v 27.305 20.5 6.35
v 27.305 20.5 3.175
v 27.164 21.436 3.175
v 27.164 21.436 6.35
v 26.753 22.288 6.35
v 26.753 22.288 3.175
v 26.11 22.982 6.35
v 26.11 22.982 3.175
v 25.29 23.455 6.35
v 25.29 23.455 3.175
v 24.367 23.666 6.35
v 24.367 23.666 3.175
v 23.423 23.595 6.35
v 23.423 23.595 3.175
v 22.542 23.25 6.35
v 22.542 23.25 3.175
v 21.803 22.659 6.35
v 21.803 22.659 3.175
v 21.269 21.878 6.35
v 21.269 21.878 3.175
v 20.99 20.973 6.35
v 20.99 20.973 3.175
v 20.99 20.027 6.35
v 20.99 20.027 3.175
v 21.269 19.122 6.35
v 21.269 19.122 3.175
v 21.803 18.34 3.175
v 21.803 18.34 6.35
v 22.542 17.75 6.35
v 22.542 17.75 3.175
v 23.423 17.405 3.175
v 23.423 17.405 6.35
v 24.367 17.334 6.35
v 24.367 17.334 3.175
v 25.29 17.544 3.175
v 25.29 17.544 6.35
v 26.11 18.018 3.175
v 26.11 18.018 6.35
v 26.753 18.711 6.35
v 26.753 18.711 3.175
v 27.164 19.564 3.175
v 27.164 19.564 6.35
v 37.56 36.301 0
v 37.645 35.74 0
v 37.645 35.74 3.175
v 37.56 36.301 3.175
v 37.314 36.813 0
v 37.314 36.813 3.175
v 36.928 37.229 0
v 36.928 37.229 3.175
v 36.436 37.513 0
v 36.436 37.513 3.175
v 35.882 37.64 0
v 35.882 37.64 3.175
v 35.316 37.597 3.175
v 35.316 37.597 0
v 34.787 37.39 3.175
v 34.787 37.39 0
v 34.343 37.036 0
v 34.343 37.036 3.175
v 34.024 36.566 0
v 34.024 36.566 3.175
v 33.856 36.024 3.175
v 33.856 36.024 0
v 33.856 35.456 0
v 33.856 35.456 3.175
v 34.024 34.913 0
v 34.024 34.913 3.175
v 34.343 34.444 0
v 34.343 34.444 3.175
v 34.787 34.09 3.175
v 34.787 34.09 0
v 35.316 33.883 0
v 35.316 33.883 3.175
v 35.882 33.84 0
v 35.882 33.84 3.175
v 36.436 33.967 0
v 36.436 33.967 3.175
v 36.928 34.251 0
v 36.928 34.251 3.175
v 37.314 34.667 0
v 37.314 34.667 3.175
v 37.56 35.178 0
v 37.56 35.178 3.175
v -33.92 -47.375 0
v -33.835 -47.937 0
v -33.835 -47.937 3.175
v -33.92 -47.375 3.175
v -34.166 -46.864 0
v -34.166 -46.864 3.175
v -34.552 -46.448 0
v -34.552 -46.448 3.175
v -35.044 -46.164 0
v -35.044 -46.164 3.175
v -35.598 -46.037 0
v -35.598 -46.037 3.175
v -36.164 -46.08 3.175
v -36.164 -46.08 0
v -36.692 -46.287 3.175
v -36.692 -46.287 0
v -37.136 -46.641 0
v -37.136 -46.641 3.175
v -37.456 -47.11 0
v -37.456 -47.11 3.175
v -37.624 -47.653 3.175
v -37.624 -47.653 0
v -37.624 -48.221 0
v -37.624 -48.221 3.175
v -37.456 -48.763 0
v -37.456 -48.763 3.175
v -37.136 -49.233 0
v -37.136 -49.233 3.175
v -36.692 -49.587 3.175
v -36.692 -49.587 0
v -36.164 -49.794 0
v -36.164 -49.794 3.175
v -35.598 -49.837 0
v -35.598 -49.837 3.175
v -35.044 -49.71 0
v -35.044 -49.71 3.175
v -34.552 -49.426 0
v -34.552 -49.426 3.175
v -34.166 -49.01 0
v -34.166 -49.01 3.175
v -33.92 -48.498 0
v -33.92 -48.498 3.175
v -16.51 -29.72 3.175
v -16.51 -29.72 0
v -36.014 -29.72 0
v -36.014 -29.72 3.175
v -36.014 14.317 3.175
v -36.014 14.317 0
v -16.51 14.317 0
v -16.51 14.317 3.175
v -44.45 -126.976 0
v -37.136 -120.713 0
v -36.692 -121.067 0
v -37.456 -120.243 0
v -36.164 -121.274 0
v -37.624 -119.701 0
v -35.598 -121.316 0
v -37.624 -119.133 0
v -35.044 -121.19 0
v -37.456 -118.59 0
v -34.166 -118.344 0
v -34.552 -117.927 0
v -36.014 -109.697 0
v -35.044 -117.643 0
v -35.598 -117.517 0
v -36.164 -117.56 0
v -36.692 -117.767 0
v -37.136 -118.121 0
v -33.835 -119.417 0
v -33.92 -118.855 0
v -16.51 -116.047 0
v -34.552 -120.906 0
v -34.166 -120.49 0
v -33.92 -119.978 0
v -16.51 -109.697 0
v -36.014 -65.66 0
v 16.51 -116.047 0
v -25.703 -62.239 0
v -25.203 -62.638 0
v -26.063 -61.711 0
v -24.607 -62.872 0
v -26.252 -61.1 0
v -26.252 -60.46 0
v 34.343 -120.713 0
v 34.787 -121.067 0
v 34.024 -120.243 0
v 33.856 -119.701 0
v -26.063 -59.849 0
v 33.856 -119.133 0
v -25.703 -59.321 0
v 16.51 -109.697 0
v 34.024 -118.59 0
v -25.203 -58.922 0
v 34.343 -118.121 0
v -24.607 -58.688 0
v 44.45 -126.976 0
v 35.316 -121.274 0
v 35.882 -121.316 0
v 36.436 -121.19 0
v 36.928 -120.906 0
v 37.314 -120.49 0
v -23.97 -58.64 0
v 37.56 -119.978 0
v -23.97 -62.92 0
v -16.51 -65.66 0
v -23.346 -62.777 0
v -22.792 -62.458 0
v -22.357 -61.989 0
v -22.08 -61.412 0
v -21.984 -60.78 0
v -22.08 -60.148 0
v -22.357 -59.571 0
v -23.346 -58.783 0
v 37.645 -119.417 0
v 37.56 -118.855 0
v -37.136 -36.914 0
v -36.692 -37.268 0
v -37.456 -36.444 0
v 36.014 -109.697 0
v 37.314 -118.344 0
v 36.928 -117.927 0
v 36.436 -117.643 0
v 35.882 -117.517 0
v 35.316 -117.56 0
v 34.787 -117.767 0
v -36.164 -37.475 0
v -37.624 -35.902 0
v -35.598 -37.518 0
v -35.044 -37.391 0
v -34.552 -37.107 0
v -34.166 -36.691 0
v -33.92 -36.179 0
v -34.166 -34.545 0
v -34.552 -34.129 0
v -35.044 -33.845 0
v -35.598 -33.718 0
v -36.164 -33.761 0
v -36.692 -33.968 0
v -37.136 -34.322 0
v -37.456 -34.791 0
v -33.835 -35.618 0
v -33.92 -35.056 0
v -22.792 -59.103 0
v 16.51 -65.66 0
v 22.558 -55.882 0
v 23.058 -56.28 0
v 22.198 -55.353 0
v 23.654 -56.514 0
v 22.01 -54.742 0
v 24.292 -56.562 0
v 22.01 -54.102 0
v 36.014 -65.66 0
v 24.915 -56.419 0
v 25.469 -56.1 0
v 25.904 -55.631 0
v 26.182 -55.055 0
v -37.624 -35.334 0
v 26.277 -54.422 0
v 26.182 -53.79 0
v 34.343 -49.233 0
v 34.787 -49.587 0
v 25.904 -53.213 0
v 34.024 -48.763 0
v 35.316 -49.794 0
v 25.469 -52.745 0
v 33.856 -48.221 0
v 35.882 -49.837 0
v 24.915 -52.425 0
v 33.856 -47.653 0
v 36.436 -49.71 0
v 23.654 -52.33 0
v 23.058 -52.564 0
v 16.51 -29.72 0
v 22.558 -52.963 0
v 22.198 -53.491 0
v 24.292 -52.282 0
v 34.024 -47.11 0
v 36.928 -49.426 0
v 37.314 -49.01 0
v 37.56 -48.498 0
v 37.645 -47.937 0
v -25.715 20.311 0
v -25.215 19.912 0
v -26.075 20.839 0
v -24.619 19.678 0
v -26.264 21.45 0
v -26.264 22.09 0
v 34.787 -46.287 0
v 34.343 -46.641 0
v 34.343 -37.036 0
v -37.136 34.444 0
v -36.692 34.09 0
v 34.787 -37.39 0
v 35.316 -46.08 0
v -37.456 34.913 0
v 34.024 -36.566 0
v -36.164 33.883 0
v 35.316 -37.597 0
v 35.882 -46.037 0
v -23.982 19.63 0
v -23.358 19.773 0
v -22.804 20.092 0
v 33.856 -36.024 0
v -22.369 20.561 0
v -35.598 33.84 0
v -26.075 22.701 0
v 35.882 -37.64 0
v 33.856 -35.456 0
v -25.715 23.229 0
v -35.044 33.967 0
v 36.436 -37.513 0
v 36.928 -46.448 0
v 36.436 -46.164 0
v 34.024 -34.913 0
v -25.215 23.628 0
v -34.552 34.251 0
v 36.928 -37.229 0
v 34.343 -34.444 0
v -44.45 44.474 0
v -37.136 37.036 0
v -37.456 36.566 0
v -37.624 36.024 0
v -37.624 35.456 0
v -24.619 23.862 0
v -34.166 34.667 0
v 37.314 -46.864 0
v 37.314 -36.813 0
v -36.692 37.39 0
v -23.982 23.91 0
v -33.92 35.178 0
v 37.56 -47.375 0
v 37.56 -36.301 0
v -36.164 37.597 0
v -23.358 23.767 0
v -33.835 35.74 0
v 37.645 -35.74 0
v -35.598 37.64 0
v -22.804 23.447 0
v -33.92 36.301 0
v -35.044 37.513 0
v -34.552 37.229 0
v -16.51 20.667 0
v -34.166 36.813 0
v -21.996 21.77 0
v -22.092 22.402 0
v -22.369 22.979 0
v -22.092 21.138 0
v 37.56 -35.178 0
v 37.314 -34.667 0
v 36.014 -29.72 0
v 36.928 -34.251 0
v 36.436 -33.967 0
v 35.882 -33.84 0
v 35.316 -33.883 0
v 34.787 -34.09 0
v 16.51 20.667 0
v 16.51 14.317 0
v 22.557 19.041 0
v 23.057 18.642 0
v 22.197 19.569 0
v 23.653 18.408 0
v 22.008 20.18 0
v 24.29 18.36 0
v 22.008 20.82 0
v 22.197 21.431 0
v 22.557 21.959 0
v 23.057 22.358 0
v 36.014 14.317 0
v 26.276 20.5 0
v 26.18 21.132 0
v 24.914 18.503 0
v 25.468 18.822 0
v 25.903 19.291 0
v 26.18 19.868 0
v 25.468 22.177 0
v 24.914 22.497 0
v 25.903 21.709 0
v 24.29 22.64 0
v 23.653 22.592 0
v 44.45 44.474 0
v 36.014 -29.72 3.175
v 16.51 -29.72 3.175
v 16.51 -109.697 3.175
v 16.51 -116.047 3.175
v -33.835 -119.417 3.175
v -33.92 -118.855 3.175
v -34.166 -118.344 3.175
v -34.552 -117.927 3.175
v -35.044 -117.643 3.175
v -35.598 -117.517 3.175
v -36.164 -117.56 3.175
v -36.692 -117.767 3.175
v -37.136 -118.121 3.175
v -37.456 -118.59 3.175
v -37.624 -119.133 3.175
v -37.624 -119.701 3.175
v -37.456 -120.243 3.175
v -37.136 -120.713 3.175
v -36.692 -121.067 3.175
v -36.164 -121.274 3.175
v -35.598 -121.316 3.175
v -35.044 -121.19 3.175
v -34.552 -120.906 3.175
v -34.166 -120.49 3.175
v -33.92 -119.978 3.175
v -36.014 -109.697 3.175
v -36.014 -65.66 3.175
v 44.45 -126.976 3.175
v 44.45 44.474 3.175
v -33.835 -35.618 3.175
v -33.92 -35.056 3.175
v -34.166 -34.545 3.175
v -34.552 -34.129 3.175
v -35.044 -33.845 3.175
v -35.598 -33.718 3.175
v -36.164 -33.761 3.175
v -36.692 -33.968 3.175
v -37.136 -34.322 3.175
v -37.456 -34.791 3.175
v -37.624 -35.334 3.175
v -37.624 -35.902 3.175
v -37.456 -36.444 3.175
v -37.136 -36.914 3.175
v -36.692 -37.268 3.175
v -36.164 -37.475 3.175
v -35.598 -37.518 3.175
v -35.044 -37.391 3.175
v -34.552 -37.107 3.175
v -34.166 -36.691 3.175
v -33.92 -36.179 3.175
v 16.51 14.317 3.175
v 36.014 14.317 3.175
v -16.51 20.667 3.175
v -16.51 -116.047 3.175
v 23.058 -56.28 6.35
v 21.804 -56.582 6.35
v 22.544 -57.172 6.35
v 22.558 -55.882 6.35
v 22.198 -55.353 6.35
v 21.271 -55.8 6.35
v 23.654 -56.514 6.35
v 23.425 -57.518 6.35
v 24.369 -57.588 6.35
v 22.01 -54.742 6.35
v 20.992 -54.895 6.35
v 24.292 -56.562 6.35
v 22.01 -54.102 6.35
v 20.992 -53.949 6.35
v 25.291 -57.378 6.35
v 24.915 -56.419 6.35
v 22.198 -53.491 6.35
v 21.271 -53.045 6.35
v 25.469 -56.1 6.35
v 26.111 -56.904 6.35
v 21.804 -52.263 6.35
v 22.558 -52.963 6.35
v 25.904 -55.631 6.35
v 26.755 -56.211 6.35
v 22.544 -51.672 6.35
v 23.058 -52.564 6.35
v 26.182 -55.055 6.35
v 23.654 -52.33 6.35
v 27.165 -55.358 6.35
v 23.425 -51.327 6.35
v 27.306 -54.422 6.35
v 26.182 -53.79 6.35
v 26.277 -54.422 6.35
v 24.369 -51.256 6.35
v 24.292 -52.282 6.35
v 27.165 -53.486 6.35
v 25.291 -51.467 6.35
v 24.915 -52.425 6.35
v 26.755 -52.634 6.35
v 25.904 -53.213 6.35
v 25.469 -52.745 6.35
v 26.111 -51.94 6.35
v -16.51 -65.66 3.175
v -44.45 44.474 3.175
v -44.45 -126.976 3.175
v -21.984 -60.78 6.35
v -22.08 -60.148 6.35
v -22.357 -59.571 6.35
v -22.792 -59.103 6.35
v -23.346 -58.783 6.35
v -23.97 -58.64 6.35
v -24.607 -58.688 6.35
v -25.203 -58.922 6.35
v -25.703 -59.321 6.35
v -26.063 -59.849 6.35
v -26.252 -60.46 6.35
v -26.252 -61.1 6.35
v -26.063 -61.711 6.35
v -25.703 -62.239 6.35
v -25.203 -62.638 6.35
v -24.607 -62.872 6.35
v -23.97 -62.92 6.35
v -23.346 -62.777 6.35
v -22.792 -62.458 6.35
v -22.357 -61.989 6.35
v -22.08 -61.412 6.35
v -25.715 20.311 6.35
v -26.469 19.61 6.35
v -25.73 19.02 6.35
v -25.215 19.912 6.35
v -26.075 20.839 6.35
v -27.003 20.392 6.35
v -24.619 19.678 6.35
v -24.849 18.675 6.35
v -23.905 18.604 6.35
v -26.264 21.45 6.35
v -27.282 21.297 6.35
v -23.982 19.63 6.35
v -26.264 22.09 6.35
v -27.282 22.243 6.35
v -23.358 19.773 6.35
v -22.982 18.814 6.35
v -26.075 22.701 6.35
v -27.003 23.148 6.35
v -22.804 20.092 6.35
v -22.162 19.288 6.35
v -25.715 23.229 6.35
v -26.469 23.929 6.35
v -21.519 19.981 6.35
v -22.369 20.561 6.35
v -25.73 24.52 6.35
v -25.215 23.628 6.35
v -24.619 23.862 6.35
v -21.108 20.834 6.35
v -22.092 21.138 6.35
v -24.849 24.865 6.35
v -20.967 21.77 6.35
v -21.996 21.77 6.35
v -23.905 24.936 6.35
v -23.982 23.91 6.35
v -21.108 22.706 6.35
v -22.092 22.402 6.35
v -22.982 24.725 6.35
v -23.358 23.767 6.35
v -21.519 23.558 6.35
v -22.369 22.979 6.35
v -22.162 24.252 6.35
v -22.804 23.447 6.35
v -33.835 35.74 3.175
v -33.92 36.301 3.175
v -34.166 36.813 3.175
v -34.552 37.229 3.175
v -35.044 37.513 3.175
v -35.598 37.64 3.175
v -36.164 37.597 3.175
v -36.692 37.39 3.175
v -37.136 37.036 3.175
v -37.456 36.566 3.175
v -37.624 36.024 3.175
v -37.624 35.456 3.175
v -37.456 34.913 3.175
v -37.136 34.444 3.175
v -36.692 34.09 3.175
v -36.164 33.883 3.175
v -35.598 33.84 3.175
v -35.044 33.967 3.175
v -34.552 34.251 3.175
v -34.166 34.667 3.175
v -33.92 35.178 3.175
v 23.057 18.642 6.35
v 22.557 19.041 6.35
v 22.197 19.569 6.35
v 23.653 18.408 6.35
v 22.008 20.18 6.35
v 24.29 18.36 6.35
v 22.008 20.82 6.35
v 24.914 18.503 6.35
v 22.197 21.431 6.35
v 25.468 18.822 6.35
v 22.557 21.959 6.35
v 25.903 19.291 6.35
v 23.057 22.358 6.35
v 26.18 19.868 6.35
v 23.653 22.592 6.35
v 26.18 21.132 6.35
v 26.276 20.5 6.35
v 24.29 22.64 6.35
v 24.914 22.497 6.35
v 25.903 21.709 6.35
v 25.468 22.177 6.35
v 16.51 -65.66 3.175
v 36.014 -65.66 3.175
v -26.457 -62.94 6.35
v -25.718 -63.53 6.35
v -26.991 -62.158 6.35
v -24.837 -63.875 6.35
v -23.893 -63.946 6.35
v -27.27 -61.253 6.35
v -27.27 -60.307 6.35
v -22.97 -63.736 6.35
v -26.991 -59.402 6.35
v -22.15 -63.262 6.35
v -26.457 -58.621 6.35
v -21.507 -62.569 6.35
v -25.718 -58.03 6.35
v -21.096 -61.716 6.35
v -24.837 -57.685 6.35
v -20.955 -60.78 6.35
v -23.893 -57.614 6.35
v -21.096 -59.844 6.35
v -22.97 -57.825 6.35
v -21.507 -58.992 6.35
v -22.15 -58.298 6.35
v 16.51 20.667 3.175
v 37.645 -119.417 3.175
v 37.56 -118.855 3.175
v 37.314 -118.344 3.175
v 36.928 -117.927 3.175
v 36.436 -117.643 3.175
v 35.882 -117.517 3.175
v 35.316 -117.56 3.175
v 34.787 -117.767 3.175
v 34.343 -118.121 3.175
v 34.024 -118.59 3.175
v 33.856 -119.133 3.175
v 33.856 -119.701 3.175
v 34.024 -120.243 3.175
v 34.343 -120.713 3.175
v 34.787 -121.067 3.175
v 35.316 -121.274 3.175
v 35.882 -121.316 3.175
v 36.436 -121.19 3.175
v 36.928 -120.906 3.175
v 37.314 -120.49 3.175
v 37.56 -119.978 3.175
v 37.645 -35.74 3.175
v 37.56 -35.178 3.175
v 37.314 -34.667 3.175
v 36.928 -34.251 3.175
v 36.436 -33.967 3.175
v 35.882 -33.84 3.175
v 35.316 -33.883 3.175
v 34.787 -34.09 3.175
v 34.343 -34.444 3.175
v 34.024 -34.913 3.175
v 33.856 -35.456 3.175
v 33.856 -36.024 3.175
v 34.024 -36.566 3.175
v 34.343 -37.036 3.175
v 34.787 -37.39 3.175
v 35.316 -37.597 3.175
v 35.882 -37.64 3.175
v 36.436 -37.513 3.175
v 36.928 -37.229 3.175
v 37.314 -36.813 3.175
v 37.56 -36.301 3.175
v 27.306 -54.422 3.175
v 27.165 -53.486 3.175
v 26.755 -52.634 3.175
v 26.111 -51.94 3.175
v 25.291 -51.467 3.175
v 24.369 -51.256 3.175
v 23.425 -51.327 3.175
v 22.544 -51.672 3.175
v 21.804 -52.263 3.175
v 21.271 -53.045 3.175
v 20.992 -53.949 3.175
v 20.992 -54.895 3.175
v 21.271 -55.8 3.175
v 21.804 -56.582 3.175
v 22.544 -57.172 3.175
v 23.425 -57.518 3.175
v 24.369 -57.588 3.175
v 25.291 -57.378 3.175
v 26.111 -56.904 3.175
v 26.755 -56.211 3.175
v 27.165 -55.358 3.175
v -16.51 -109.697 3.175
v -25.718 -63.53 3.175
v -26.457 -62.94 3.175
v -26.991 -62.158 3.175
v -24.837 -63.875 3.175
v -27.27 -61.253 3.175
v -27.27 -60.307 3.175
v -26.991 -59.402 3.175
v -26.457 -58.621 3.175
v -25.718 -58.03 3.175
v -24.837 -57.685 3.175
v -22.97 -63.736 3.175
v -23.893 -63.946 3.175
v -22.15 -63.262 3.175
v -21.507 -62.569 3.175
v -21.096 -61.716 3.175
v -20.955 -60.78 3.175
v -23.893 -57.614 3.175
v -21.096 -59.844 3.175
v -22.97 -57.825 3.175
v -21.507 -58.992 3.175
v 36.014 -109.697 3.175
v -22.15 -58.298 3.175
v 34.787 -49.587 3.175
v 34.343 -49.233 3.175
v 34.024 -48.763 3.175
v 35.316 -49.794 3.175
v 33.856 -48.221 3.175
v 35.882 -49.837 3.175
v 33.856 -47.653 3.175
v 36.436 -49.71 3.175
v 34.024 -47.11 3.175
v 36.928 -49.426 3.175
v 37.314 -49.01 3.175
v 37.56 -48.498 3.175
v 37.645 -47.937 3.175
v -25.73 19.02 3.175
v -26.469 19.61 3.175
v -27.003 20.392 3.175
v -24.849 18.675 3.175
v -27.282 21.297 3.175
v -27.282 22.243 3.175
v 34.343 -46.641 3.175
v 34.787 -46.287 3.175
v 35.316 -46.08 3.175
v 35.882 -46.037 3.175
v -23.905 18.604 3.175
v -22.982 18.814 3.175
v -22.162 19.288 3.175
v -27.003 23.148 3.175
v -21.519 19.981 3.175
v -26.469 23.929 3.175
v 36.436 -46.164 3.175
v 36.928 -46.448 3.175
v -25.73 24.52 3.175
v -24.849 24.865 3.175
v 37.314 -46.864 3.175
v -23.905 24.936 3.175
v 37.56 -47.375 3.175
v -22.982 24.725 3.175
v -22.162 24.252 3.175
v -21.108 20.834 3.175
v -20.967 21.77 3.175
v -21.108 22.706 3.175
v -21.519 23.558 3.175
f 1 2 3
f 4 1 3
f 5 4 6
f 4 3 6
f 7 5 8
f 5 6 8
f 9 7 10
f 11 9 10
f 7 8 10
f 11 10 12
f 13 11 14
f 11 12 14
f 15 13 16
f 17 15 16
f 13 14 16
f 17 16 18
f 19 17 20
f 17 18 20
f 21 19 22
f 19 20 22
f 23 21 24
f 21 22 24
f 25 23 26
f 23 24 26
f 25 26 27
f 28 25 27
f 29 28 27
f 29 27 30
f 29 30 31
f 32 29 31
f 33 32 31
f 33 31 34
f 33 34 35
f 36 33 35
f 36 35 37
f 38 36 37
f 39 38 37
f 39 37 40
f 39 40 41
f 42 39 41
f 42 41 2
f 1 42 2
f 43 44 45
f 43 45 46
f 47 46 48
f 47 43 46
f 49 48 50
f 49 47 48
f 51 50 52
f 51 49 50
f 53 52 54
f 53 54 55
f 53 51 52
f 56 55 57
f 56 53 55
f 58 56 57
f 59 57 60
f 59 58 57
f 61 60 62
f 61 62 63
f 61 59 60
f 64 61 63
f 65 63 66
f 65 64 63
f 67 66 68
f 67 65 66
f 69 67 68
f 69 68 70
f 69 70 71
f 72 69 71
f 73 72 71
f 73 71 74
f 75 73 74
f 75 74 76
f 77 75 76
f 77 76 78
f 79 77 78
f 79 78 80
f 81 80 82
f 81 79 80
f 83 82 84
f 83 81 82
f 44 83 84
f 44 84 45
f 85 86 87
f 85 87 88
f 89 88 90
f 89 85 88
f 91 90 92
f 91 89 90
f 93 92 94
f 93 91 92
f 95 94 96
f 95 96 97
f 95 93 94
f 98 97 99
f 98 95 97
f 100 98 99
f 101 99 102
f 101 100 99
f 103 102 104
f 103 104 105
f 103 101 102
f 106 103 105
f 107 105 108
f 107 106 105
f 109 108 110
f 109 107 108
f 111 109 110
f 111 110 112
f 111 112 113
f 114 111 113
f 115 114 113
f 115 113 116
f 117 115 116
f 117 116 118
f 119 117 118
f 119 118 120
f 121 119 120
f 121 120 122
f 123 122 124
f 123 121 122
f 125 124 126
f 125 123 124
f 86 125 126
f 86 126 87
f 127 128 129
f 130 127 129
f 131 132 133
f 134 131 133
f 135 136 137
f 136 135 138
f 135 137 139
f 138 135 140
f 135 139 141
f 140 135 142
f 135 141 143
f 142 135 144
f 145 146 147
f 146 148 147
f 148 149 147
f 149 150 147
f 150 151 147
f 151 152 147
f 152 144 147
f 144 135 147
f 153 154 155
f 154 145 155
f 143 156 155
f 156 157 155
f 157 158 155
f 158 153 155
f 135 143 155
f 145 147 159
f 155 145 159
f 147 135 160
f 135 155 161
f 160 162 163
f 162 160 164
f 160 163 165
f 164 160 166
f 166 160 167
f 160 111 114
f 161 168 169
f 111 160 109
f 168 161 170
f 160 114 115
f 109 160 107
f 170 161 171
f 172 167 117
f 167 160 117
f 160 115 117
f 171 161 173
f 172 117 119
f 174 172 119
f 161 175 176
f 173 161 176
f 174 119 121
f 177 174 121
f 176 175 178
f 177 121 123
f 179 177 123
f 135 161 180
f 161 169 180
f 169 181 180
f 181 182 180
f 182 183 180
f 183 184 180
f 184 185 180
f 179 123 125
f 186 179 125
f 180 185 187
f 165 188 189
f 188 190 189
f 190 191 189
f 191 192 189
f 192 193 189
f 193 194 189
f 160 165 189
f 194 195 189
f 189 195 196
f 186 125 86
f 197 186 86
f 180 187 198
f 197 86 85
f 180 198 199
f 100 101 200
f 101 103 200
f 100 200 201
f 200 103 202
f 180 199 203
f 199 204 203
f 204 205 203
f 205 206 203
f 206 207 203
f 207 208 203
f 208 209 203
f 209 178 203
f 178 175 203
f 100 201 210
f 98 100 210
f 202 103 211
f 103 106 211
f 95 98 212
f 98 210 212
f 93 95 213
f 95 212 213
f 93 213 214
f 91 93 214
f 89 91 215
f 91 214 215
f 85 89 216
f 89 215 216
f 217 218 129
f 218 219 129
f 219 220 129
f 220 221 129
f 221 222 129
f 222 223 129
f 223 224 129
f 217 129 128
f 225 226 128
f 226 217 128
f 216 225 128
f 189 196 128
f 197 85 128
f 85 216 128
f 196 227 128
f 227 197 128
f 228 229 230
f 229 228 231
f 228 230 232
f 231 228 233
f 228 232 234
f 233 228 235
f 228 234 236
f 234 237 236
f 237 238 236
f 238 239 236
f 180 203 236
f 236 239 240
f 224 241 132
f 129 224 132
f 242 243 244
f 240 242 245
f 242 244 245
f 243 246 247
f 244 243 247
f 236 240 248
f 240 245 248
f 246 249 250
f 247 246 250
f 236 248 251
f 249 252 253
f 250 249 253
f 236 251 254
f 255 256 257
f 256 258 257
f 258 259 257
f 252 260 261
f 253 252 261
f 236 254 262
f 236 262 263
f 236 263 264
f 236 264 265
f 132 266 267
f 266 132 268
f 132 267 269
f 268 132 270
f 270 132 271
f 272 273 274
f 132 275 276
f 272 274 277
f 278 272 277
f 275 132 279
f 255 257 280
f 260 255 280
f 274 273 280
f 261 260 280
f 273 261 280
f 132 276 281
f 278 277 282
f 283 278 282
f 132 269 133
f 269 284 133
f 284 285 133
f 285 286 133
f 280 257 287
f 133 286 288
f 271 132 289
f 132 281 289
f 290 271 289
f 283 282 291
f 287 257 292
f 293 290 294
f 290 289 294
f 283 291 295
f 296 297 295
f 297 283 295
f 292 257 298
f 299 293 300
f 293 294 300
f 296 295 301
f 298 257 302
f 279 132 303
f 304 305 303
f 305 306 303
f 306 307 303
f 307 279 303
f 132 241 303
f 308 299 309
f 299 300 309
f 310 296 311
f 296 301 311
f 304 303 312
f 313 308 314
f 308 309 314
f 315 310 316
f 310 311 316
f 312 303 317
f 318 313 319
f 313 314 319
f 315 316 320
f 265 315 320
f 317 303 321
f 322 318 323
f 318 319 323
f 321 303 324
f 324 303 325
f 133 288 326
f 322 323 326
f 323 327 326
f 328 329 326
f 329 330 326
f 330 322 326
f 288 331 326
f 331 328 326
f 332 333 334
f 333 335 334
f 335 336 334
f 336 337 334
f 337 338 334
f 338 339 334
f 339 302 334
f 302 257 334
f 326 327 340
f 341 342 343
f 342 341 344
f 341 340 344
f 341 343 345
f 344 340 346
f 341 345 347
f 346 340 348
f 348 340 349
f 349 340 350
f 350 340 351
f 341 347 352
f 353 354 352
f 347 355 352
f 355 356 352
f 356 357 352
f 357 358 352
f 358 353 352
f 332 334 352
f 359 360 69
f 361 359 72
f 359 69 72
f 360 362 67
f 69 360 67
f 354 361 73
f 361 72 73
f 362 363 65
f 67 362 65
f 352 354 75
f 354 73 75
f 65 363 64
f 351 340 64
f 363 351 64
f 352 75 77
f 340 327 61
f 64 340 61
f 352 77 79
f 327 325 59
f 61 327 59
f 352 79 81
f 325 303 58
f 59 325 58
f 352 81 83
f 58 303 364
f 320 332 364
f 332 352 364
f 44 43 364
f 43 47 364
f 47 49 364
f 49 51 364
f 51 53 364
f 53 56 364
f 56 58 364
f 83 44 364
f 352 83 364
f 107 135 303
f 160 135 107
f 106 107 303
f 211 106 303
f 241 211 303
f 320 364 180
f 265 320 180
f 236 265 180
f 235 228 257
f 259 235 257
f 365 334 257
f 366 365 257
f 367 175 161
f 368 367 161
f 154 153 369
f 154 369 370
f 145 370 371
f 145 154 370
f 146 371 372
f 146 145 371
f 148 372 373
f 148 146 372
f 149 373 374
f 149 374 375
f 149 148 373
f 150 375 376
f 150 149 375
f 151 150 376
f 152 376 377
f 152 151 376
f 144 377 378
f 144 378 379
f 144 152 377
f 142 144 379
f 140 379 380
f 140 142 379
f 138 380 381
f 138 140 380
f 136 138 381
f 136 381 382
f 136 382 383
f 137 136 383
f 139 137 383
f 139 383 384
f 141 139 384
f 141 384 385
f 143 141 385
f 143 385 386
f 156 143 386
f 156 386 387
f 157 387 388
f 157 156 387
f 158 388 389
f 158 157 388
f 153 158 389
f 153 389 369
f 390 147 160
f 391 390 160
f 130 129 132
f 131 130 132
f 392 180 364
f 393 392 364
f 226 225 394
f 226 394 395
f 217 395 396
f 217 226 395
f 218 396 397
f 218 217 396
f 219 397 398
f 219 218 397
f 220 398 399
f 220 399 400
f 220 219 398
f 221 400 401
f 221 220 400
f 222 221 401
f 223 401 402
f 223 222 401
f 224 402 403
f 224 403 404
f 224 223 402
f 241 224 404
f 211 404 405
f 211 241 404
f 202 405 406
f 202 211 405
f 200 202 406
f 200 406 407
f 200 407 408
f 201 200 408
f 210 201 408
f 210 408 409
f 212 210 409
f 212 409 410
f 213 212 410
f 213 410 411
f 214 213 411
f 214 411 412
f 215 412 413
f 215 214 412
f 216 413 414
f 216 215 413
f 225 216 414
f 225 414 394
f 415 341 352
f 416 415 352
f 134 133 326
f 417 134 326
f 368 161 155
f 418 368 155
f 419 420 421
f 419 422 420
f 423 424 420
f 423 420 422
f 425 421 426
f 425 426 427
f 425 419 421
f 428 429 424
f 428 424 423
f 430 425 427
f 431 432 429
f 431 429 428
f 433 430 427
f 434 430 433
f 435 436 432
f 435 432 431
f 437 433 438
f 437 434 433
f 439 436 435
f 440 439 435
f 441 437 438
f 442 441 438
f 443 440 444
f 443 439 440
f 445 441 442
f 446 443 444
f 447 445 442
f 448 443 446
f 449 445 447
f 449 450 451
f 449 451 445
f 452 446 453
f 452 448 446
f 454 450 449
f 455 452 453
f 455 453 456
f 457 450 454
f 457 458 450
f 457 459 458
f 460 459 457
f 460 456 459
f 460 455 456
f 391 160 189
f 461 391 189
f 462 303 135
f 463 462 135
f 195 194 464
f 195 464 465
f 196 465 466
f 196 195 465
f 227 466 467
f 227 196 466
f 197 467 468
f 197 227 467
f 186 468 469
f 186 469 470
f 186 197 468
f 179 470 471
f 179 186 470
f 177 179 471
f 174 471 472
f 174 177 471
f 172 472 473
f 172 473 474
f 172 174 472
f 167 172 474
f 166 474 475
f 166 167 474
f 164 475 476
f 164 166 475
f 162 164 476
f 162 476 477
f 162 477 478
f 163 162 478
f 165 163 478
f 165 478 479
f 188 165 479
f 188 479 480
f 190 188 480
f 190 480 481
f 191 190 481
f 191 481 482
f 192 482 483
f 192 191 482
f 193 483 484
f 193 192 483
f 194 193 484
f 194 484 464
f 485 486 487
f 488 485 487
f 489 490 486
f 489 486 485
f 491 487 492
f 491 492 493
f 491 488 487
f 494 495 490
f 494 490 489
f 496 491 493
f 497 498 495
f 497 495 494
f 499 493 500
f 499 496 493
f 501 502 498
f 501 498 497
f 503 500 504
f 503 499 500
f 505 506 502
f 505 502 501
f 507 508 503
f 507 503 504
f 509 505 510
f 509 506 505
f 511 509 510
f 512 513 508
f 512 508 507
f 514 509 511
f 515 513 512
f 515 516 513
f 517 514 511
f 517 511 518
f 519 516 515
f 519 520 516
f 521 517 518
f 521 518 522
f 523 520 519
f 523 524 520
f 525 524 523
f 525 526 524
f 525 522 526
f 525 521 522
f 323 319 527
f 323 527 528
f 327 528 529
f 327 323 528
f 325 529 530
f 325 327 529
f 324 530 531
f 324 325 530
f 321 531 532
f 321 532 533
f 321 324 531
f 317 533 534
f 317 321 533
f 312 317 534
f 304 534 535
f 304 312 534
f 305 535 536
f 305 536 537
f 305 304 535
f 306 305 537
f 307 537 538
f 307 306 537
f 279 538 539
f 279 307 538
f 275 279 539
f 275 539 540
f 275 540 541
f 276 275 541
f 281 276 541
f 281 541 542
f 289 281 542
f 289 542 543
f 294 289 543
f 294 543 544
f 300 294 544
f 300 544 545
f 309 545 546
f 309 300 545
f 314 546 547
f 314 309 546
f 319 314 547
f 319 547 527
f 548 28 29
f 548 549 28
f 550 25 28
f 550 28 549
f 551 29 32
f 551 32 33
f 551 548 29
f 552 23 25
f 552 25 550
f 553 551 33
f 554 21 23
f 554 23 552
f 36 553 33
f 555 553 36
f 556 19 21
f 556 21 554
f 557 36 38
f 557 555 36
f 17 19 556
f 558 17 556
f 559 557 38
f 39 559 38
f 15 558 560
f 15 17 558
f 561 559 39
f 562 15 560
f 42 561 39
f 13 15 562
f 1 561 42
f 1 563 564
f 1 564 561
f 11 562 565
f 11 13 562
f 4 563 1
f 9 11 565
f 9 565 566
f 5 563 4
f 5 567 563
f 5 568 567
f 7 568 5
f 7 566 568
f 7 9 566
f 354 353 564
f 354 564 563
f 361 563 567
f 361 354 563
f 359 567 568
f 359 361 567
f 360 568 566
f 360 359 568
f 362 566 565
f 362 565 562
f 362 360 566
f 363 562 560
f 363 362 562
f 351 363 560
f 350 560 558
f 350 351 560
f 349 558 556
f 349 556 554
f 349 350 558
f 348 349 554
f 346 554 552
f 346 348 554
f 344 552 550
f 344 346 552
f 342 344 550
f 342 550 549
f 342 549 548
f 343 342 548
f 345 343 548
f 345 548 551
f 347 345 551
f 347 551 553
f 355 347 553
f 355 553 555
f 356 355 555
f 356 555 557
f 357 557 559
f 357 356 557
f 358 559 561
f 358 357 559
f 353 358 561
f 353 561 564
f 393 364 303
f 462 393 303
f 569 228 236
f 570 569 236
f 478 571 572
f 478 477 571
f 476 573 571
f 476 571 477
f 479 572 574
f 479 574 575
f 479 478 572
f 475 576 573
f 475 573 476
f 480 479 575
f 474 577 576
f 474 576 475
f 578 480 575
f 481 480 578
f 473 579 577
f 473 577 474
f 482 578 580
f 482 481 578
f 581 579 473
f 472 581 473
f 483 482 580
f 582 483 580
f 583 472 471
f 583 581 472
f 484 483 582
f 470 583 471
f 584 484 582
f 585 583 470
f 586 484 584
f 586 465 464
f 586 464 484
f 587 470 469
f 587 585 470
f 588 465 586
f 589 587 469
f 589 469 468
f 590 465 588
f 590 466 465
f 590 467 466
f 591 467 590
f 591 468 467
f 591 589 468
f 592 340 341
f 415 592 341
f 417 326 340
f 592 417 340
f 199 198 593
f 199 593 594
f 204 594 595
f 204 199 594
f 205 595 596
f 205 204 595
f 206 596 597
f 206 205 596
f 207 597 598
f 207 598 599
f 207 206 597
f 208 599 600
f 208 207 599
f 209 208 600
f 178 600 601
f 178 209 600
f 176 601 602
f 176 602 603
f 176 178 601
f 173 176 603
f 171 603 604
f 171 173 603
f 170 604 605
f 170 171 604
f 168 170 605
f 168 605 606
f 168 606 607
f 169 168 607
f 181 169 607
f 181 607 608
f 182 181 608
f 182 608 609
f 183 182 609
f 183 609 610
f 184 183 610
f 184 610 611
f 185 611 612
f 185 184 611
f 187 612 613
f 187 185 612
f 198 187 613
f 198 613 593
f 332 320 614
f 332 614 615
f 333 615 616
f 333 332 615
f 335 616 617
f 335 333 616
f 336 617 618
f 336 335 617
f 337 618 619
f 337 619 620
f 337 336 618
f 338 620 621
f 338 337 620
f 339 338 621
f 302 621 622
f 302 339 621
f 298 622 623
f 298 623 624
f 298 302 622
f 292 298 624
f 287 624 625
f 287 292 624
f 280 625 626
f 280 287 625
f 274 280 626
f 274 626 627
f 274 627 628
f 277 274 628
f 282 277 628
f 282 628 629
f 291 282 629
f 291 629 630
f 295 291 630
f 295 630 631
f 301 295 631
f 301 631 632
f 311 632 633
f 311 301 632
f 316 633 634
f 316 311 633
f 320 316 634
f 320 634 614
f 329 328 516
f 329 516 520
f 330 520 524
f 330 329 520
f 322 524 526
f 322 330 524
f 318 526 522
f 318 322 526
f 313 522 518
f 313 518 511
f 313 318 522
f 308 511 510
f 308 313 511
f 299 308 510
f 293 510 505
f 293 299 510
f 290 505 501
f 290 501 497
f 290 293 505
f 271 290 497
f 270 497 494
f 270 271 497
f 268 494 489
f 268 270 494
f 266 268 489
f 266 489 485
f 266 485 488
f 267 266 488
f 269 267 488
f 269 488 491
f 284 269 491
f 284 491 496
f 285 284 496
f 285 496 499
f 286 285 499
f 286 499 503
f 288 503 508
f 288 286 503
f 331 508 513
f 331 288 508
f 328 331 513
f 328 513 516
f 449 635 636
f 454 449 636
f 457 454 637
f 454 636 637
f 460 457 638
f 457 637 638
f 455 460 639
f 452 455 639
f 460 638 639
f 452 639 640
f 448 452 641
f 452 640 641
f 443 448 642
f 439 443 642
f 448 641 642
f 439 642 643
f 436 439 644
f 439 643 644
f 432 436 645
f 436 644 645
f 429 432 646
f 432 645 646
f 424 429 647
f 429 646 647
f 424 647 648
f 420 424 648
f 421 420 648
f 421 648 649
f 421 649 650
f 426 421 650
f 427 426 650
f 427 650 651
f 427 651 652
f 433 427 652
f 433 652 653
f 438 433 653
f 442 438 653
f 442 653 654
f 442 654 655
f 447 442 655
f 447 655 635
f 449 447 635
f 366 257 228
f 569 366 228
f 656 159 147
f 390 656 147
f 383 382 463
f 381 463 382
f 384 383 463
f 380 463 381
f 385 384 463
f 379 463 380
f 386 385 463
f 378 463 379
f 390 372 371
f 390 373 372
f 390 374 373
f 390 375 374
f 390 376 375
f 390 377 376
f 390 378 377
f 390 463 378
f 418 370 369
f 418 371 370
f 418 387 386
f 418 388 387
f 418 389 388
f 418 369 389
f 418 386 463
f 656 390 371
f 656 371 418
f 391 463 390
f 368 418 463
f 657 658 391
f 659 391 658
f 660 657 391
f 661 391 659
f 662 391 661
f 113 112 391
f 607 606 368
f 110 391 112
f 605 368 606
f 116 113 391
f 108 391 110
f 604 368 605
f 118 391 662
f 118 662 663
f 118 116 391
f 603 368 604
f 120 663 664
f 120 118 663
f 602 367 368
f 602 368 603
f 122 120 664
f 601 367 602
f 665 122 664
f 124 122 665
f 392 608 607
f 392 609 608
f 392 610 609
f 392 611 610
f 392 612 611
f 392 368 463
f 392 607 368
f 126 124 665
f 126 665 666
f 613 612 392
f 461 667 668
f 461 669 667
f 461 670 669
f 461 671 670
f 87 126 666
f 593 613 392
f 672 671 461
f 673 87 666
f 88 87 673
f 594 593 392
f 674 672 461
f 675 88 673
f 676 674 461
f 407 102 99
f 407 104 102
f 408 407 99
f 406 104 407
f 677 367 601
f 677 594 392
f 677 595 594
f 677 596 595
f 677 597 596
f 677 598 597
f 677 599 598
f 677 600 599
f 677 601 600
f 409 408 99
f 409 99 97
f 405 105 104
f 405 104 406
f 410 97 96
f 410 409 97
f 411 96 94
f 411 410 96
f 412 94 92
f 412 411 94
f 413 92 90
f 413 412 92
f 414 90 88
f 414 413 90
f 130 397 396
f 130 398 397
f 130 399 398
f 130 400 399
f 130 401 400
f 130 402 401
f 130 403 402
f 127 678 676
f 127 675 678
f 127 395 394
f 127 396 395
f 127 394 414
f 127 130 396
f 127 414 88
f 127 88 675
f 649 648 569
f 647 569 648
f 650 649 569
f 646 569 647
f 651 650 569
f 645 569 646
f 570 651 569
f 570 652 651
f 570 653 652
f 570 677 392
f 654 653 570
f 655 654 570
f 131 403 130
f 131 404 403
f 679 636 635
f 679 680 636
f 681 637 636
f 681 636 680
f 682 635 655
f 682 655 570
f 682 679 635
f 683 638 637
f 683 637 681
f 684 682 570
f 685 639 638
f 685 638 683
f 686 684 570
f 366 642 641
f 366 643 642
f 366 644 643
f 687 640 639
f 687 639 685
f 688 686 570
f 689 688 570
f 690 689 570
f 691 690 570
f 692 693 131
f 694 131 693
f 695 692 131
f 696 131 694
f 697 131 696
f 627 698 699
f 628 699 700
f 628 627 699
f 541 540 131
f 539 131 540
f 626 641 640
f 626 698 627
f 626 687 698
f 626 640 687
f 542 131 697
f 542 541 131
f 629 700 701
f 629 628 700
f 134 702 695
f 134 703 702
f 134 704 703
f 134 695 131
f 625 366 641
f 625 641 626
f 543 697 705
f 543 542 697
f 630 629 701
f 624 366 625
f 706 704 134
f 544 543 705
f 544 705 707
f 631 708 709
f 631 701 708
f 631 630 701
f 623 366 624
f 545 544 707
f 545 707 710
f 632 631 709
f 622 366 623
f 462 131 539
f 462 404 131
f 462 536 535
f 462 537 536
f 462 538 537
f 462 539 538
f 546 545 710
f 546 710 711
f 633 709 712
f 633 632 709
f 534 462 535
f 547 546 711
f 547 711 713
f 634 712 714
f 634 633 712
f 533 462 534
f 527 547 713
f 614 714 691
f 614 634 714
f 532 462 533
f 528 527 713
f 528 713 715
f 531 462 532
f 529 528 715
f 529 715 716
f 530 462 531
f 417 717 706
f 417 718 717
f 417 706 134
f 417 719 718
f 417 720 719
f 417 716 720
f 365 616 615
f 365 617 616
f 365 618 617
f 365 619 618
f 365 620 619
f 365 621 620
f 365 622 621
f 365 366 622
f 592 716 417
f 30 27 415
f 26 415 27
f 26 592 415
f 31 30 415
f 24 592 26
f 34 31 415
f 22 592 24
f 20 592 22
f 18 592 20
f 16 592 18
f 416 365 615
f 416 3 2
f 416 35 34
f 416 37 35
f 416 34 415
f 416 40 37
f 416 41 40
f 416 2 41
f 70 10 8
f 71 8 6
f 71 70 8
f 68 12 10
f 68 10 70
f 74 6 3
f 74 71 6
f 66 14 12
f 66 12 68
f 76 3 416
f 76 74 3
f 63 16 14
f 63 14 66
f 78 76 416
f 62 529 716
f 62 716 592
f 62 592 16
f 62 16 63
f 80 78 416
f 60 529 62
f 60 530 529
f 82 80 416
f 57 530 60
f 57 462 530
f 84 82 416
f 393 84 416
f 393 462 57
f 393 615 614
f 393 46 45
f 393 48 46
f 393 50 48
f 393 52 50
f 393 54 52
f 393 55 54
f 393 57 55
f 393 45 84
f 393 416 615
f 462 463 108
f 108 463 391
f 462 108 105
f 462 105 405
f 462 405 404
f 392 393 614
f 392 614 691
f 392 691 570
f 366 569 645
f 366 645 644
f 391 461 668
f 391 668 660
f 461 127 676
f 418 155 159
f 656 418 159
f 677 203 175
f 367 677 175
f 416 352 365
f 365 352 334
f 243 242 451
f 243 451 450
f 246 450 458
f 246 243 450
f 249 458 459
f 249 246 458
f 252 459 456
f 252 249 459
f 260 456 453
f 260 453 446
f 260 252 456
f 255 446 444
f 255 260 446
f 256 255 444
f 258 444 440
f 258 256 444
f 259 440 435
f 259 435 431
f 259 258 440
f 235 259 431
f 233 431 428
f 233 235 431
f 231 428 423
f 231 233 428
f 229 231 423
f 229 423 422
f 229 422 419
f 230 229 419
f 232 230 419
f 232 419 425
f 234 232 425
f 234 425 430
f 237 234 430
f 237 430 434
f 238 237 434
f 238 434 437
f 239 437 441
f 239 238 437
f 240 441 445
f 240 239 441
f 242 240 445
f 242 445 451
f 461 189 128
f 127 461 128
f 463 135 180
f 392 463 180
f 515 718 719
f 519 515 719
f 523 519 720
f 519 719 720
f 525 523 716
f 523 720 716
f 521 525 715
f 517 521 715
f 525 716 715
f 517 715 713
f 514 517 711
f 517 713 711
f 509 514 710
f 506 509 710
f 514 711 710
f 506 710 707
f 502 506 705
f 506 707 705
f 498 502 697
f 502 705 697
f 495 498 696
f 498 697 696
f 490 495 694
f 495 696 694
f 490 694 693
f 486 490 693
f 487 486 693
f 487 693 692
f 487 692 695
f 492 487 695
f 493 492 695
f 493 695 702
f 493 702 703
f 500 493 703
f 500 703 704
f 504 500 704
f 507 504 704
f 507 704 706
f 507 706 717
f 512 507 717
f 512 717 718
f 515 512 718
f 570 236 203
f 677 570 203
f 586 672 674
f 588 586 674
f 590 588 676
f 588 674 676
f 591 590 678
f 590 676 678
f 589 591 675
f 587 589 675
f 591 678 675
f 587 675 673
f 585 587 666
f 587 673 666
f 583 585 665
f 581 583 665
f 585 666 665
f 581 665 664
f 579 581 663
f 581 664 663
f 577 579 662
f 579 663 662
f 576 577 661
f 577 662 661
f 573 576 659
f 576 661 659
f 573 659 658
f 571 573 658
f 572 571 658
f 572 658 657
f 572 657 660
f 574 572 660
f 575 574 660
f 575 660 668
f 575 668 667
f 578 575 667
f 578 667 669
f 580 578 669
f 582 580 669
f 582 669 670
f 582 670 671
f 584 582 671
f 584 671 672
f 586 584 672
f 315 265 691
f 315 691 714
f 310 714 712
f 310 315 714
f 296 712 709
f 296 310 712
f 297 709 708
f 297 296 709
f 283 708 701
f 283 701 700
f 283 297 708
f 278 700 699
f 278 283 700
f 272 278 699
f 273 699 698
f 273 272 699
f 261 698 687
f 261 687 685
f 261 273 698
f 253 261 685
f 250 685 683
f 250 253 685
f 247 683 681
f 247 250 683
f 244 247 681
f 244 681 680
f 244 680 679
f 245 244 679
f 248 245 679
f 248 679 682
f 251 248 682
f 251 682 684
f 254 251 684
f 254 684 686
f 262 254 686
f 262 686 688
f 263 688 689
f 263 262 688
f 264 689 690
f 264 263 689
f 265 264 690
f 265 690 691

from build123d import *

# Parameters (mm, degrees)
F0_R     = 1.905
F0_R_2   = 3.175
F1_DEPTH = 3.175
F0_R_3   = 2.1456580426
F2_DEPTH = 6.35


# Not quite as in the source:
# - ends of sketch curves that miss each other by under 0.0002 mm in the source are joined


with BuildPart() as f1:
    # F0 (on Top) → F1 (new body)
    with BuildSketch(Plane.XY):
        Polygon((44.45, 44.4739684463), (-44.45, 44.4739684463), (-44.45, -126.9760241032), (44.4500006139, -126.9760241032), align=None)
        with Locations((-35.7399480417, -119.4167938083)):
            Circle(F0_R, mode=Mode.SUBTRACT)
        with Locations((-35.7399480417, -47.9368977249)):
            Circle(F0_R, mode=Mode.SUBTRACT)
        with Locations((-24.13, -60.7800519583)):
            Circle(F0_R_2, mode=Mode.SUBTRACT)
        Polygon((-16.5099999687, 14.3167711779), (-16.5099999992, 20.6667711779), (16.5100000008, 20.6667711779), (16.5100000313, 14.3167711779), (36.0137783311, 14.3167711779), (36.0137783311, -29.7200025995), (16.5100000008, -29.7200026932), (16.5099995171, -65.6599379314), (36.013777817, -65.6599379314), (36.013777817, -109.6967117089), (16.5099994866, -109.6967118025), (16.5099995476, -116.0467118025), (-16.5100004524, -116.0467118025), (-16.5100004829, -109.6967118025), (-36.0137786019, -109.6967118961), (-36.0137788132, -65.659938025), (-16.5100004829, -65.6599379314), (-16.5099999687, -29.7200026932), (-36.0137780877, -29.7200027868), (-36.0137782991, 14.3167710843), align=None, mode=Mode.SUBTRACT)
        with Locations((35.7399480417, -119.4167938083)):
            Circle(F0_R, mode=Mode.SUBTRACT)
        with Locations((24.1312399077, -54.422124289)):
            Circle(F0_R_2, mode=Mode.SUBTRACT)
        with Locations((35.7399480417, -47.9368977249)):
            Circle(F0_R, mode=Mode.SUBTRACT)
        with Locations((-35.7399480417, -35.6178977249)):
            Circle(F0_R, mode=Mode.SUBTRACT)
        with Locations((-24.142025454, 21.7699480417)):
            Circle(F0_R_2, mode=Mode.SUBTRACT)
        with Locations((-35.7399480417, 35.7399480417)):
            Circle(F0_R, mode=Mode.SUBTRACT)
        with Locations((35.7399480417, -35.7399480417)):
            Circle(F0_R, mode=Mode.SUBTRACT)
        with Locations((24.13, 20.4999480417)):
            Circle(F0_R_2, mode=Mode.SUBTRACT)
        with Locations((35.7399480417, 35.7399480417)):
            Circle(F0_R, mode=Mode.SUBTRACT)
    extrude(amount=F1_DEPTH)

    # F0 (on Top) → F2 (join)
    with BuildSketch(Plane.XY):
        with Locations((-24.13, -60.7800519583)):
            Circle(F0_R_2)
        with Locations((-24.13, -60.7800519583)):
            Circle(F0_R_3, mode=Mode.SUBTRACT)
        with Locations((-24.142025454, 21.7699480417)):
            Circle(F0_R_2)
        with Locations((-24.142025454, 21.7699480417)):
            Circle(F0_R_3, mode=Mode.SUBTRACT)
        with Locations((24.1312399077, -54.422124289)):
            Circle(F0_R_2)
        with Locations((24.1312399077, -54.422124289)):
            Circle(F0_R_3, mode=Mode.SUBTRACT)
        with Locations((24.13, 20.4999480417)):
            Circle(F0_R_2)
        with Locations((24.13, 20.4999480417)):
            Circle(F0_R_3, mode=Mode.SUBTRACT)
    extrude(amount=F2_DEPTH)


solid = f1.part
